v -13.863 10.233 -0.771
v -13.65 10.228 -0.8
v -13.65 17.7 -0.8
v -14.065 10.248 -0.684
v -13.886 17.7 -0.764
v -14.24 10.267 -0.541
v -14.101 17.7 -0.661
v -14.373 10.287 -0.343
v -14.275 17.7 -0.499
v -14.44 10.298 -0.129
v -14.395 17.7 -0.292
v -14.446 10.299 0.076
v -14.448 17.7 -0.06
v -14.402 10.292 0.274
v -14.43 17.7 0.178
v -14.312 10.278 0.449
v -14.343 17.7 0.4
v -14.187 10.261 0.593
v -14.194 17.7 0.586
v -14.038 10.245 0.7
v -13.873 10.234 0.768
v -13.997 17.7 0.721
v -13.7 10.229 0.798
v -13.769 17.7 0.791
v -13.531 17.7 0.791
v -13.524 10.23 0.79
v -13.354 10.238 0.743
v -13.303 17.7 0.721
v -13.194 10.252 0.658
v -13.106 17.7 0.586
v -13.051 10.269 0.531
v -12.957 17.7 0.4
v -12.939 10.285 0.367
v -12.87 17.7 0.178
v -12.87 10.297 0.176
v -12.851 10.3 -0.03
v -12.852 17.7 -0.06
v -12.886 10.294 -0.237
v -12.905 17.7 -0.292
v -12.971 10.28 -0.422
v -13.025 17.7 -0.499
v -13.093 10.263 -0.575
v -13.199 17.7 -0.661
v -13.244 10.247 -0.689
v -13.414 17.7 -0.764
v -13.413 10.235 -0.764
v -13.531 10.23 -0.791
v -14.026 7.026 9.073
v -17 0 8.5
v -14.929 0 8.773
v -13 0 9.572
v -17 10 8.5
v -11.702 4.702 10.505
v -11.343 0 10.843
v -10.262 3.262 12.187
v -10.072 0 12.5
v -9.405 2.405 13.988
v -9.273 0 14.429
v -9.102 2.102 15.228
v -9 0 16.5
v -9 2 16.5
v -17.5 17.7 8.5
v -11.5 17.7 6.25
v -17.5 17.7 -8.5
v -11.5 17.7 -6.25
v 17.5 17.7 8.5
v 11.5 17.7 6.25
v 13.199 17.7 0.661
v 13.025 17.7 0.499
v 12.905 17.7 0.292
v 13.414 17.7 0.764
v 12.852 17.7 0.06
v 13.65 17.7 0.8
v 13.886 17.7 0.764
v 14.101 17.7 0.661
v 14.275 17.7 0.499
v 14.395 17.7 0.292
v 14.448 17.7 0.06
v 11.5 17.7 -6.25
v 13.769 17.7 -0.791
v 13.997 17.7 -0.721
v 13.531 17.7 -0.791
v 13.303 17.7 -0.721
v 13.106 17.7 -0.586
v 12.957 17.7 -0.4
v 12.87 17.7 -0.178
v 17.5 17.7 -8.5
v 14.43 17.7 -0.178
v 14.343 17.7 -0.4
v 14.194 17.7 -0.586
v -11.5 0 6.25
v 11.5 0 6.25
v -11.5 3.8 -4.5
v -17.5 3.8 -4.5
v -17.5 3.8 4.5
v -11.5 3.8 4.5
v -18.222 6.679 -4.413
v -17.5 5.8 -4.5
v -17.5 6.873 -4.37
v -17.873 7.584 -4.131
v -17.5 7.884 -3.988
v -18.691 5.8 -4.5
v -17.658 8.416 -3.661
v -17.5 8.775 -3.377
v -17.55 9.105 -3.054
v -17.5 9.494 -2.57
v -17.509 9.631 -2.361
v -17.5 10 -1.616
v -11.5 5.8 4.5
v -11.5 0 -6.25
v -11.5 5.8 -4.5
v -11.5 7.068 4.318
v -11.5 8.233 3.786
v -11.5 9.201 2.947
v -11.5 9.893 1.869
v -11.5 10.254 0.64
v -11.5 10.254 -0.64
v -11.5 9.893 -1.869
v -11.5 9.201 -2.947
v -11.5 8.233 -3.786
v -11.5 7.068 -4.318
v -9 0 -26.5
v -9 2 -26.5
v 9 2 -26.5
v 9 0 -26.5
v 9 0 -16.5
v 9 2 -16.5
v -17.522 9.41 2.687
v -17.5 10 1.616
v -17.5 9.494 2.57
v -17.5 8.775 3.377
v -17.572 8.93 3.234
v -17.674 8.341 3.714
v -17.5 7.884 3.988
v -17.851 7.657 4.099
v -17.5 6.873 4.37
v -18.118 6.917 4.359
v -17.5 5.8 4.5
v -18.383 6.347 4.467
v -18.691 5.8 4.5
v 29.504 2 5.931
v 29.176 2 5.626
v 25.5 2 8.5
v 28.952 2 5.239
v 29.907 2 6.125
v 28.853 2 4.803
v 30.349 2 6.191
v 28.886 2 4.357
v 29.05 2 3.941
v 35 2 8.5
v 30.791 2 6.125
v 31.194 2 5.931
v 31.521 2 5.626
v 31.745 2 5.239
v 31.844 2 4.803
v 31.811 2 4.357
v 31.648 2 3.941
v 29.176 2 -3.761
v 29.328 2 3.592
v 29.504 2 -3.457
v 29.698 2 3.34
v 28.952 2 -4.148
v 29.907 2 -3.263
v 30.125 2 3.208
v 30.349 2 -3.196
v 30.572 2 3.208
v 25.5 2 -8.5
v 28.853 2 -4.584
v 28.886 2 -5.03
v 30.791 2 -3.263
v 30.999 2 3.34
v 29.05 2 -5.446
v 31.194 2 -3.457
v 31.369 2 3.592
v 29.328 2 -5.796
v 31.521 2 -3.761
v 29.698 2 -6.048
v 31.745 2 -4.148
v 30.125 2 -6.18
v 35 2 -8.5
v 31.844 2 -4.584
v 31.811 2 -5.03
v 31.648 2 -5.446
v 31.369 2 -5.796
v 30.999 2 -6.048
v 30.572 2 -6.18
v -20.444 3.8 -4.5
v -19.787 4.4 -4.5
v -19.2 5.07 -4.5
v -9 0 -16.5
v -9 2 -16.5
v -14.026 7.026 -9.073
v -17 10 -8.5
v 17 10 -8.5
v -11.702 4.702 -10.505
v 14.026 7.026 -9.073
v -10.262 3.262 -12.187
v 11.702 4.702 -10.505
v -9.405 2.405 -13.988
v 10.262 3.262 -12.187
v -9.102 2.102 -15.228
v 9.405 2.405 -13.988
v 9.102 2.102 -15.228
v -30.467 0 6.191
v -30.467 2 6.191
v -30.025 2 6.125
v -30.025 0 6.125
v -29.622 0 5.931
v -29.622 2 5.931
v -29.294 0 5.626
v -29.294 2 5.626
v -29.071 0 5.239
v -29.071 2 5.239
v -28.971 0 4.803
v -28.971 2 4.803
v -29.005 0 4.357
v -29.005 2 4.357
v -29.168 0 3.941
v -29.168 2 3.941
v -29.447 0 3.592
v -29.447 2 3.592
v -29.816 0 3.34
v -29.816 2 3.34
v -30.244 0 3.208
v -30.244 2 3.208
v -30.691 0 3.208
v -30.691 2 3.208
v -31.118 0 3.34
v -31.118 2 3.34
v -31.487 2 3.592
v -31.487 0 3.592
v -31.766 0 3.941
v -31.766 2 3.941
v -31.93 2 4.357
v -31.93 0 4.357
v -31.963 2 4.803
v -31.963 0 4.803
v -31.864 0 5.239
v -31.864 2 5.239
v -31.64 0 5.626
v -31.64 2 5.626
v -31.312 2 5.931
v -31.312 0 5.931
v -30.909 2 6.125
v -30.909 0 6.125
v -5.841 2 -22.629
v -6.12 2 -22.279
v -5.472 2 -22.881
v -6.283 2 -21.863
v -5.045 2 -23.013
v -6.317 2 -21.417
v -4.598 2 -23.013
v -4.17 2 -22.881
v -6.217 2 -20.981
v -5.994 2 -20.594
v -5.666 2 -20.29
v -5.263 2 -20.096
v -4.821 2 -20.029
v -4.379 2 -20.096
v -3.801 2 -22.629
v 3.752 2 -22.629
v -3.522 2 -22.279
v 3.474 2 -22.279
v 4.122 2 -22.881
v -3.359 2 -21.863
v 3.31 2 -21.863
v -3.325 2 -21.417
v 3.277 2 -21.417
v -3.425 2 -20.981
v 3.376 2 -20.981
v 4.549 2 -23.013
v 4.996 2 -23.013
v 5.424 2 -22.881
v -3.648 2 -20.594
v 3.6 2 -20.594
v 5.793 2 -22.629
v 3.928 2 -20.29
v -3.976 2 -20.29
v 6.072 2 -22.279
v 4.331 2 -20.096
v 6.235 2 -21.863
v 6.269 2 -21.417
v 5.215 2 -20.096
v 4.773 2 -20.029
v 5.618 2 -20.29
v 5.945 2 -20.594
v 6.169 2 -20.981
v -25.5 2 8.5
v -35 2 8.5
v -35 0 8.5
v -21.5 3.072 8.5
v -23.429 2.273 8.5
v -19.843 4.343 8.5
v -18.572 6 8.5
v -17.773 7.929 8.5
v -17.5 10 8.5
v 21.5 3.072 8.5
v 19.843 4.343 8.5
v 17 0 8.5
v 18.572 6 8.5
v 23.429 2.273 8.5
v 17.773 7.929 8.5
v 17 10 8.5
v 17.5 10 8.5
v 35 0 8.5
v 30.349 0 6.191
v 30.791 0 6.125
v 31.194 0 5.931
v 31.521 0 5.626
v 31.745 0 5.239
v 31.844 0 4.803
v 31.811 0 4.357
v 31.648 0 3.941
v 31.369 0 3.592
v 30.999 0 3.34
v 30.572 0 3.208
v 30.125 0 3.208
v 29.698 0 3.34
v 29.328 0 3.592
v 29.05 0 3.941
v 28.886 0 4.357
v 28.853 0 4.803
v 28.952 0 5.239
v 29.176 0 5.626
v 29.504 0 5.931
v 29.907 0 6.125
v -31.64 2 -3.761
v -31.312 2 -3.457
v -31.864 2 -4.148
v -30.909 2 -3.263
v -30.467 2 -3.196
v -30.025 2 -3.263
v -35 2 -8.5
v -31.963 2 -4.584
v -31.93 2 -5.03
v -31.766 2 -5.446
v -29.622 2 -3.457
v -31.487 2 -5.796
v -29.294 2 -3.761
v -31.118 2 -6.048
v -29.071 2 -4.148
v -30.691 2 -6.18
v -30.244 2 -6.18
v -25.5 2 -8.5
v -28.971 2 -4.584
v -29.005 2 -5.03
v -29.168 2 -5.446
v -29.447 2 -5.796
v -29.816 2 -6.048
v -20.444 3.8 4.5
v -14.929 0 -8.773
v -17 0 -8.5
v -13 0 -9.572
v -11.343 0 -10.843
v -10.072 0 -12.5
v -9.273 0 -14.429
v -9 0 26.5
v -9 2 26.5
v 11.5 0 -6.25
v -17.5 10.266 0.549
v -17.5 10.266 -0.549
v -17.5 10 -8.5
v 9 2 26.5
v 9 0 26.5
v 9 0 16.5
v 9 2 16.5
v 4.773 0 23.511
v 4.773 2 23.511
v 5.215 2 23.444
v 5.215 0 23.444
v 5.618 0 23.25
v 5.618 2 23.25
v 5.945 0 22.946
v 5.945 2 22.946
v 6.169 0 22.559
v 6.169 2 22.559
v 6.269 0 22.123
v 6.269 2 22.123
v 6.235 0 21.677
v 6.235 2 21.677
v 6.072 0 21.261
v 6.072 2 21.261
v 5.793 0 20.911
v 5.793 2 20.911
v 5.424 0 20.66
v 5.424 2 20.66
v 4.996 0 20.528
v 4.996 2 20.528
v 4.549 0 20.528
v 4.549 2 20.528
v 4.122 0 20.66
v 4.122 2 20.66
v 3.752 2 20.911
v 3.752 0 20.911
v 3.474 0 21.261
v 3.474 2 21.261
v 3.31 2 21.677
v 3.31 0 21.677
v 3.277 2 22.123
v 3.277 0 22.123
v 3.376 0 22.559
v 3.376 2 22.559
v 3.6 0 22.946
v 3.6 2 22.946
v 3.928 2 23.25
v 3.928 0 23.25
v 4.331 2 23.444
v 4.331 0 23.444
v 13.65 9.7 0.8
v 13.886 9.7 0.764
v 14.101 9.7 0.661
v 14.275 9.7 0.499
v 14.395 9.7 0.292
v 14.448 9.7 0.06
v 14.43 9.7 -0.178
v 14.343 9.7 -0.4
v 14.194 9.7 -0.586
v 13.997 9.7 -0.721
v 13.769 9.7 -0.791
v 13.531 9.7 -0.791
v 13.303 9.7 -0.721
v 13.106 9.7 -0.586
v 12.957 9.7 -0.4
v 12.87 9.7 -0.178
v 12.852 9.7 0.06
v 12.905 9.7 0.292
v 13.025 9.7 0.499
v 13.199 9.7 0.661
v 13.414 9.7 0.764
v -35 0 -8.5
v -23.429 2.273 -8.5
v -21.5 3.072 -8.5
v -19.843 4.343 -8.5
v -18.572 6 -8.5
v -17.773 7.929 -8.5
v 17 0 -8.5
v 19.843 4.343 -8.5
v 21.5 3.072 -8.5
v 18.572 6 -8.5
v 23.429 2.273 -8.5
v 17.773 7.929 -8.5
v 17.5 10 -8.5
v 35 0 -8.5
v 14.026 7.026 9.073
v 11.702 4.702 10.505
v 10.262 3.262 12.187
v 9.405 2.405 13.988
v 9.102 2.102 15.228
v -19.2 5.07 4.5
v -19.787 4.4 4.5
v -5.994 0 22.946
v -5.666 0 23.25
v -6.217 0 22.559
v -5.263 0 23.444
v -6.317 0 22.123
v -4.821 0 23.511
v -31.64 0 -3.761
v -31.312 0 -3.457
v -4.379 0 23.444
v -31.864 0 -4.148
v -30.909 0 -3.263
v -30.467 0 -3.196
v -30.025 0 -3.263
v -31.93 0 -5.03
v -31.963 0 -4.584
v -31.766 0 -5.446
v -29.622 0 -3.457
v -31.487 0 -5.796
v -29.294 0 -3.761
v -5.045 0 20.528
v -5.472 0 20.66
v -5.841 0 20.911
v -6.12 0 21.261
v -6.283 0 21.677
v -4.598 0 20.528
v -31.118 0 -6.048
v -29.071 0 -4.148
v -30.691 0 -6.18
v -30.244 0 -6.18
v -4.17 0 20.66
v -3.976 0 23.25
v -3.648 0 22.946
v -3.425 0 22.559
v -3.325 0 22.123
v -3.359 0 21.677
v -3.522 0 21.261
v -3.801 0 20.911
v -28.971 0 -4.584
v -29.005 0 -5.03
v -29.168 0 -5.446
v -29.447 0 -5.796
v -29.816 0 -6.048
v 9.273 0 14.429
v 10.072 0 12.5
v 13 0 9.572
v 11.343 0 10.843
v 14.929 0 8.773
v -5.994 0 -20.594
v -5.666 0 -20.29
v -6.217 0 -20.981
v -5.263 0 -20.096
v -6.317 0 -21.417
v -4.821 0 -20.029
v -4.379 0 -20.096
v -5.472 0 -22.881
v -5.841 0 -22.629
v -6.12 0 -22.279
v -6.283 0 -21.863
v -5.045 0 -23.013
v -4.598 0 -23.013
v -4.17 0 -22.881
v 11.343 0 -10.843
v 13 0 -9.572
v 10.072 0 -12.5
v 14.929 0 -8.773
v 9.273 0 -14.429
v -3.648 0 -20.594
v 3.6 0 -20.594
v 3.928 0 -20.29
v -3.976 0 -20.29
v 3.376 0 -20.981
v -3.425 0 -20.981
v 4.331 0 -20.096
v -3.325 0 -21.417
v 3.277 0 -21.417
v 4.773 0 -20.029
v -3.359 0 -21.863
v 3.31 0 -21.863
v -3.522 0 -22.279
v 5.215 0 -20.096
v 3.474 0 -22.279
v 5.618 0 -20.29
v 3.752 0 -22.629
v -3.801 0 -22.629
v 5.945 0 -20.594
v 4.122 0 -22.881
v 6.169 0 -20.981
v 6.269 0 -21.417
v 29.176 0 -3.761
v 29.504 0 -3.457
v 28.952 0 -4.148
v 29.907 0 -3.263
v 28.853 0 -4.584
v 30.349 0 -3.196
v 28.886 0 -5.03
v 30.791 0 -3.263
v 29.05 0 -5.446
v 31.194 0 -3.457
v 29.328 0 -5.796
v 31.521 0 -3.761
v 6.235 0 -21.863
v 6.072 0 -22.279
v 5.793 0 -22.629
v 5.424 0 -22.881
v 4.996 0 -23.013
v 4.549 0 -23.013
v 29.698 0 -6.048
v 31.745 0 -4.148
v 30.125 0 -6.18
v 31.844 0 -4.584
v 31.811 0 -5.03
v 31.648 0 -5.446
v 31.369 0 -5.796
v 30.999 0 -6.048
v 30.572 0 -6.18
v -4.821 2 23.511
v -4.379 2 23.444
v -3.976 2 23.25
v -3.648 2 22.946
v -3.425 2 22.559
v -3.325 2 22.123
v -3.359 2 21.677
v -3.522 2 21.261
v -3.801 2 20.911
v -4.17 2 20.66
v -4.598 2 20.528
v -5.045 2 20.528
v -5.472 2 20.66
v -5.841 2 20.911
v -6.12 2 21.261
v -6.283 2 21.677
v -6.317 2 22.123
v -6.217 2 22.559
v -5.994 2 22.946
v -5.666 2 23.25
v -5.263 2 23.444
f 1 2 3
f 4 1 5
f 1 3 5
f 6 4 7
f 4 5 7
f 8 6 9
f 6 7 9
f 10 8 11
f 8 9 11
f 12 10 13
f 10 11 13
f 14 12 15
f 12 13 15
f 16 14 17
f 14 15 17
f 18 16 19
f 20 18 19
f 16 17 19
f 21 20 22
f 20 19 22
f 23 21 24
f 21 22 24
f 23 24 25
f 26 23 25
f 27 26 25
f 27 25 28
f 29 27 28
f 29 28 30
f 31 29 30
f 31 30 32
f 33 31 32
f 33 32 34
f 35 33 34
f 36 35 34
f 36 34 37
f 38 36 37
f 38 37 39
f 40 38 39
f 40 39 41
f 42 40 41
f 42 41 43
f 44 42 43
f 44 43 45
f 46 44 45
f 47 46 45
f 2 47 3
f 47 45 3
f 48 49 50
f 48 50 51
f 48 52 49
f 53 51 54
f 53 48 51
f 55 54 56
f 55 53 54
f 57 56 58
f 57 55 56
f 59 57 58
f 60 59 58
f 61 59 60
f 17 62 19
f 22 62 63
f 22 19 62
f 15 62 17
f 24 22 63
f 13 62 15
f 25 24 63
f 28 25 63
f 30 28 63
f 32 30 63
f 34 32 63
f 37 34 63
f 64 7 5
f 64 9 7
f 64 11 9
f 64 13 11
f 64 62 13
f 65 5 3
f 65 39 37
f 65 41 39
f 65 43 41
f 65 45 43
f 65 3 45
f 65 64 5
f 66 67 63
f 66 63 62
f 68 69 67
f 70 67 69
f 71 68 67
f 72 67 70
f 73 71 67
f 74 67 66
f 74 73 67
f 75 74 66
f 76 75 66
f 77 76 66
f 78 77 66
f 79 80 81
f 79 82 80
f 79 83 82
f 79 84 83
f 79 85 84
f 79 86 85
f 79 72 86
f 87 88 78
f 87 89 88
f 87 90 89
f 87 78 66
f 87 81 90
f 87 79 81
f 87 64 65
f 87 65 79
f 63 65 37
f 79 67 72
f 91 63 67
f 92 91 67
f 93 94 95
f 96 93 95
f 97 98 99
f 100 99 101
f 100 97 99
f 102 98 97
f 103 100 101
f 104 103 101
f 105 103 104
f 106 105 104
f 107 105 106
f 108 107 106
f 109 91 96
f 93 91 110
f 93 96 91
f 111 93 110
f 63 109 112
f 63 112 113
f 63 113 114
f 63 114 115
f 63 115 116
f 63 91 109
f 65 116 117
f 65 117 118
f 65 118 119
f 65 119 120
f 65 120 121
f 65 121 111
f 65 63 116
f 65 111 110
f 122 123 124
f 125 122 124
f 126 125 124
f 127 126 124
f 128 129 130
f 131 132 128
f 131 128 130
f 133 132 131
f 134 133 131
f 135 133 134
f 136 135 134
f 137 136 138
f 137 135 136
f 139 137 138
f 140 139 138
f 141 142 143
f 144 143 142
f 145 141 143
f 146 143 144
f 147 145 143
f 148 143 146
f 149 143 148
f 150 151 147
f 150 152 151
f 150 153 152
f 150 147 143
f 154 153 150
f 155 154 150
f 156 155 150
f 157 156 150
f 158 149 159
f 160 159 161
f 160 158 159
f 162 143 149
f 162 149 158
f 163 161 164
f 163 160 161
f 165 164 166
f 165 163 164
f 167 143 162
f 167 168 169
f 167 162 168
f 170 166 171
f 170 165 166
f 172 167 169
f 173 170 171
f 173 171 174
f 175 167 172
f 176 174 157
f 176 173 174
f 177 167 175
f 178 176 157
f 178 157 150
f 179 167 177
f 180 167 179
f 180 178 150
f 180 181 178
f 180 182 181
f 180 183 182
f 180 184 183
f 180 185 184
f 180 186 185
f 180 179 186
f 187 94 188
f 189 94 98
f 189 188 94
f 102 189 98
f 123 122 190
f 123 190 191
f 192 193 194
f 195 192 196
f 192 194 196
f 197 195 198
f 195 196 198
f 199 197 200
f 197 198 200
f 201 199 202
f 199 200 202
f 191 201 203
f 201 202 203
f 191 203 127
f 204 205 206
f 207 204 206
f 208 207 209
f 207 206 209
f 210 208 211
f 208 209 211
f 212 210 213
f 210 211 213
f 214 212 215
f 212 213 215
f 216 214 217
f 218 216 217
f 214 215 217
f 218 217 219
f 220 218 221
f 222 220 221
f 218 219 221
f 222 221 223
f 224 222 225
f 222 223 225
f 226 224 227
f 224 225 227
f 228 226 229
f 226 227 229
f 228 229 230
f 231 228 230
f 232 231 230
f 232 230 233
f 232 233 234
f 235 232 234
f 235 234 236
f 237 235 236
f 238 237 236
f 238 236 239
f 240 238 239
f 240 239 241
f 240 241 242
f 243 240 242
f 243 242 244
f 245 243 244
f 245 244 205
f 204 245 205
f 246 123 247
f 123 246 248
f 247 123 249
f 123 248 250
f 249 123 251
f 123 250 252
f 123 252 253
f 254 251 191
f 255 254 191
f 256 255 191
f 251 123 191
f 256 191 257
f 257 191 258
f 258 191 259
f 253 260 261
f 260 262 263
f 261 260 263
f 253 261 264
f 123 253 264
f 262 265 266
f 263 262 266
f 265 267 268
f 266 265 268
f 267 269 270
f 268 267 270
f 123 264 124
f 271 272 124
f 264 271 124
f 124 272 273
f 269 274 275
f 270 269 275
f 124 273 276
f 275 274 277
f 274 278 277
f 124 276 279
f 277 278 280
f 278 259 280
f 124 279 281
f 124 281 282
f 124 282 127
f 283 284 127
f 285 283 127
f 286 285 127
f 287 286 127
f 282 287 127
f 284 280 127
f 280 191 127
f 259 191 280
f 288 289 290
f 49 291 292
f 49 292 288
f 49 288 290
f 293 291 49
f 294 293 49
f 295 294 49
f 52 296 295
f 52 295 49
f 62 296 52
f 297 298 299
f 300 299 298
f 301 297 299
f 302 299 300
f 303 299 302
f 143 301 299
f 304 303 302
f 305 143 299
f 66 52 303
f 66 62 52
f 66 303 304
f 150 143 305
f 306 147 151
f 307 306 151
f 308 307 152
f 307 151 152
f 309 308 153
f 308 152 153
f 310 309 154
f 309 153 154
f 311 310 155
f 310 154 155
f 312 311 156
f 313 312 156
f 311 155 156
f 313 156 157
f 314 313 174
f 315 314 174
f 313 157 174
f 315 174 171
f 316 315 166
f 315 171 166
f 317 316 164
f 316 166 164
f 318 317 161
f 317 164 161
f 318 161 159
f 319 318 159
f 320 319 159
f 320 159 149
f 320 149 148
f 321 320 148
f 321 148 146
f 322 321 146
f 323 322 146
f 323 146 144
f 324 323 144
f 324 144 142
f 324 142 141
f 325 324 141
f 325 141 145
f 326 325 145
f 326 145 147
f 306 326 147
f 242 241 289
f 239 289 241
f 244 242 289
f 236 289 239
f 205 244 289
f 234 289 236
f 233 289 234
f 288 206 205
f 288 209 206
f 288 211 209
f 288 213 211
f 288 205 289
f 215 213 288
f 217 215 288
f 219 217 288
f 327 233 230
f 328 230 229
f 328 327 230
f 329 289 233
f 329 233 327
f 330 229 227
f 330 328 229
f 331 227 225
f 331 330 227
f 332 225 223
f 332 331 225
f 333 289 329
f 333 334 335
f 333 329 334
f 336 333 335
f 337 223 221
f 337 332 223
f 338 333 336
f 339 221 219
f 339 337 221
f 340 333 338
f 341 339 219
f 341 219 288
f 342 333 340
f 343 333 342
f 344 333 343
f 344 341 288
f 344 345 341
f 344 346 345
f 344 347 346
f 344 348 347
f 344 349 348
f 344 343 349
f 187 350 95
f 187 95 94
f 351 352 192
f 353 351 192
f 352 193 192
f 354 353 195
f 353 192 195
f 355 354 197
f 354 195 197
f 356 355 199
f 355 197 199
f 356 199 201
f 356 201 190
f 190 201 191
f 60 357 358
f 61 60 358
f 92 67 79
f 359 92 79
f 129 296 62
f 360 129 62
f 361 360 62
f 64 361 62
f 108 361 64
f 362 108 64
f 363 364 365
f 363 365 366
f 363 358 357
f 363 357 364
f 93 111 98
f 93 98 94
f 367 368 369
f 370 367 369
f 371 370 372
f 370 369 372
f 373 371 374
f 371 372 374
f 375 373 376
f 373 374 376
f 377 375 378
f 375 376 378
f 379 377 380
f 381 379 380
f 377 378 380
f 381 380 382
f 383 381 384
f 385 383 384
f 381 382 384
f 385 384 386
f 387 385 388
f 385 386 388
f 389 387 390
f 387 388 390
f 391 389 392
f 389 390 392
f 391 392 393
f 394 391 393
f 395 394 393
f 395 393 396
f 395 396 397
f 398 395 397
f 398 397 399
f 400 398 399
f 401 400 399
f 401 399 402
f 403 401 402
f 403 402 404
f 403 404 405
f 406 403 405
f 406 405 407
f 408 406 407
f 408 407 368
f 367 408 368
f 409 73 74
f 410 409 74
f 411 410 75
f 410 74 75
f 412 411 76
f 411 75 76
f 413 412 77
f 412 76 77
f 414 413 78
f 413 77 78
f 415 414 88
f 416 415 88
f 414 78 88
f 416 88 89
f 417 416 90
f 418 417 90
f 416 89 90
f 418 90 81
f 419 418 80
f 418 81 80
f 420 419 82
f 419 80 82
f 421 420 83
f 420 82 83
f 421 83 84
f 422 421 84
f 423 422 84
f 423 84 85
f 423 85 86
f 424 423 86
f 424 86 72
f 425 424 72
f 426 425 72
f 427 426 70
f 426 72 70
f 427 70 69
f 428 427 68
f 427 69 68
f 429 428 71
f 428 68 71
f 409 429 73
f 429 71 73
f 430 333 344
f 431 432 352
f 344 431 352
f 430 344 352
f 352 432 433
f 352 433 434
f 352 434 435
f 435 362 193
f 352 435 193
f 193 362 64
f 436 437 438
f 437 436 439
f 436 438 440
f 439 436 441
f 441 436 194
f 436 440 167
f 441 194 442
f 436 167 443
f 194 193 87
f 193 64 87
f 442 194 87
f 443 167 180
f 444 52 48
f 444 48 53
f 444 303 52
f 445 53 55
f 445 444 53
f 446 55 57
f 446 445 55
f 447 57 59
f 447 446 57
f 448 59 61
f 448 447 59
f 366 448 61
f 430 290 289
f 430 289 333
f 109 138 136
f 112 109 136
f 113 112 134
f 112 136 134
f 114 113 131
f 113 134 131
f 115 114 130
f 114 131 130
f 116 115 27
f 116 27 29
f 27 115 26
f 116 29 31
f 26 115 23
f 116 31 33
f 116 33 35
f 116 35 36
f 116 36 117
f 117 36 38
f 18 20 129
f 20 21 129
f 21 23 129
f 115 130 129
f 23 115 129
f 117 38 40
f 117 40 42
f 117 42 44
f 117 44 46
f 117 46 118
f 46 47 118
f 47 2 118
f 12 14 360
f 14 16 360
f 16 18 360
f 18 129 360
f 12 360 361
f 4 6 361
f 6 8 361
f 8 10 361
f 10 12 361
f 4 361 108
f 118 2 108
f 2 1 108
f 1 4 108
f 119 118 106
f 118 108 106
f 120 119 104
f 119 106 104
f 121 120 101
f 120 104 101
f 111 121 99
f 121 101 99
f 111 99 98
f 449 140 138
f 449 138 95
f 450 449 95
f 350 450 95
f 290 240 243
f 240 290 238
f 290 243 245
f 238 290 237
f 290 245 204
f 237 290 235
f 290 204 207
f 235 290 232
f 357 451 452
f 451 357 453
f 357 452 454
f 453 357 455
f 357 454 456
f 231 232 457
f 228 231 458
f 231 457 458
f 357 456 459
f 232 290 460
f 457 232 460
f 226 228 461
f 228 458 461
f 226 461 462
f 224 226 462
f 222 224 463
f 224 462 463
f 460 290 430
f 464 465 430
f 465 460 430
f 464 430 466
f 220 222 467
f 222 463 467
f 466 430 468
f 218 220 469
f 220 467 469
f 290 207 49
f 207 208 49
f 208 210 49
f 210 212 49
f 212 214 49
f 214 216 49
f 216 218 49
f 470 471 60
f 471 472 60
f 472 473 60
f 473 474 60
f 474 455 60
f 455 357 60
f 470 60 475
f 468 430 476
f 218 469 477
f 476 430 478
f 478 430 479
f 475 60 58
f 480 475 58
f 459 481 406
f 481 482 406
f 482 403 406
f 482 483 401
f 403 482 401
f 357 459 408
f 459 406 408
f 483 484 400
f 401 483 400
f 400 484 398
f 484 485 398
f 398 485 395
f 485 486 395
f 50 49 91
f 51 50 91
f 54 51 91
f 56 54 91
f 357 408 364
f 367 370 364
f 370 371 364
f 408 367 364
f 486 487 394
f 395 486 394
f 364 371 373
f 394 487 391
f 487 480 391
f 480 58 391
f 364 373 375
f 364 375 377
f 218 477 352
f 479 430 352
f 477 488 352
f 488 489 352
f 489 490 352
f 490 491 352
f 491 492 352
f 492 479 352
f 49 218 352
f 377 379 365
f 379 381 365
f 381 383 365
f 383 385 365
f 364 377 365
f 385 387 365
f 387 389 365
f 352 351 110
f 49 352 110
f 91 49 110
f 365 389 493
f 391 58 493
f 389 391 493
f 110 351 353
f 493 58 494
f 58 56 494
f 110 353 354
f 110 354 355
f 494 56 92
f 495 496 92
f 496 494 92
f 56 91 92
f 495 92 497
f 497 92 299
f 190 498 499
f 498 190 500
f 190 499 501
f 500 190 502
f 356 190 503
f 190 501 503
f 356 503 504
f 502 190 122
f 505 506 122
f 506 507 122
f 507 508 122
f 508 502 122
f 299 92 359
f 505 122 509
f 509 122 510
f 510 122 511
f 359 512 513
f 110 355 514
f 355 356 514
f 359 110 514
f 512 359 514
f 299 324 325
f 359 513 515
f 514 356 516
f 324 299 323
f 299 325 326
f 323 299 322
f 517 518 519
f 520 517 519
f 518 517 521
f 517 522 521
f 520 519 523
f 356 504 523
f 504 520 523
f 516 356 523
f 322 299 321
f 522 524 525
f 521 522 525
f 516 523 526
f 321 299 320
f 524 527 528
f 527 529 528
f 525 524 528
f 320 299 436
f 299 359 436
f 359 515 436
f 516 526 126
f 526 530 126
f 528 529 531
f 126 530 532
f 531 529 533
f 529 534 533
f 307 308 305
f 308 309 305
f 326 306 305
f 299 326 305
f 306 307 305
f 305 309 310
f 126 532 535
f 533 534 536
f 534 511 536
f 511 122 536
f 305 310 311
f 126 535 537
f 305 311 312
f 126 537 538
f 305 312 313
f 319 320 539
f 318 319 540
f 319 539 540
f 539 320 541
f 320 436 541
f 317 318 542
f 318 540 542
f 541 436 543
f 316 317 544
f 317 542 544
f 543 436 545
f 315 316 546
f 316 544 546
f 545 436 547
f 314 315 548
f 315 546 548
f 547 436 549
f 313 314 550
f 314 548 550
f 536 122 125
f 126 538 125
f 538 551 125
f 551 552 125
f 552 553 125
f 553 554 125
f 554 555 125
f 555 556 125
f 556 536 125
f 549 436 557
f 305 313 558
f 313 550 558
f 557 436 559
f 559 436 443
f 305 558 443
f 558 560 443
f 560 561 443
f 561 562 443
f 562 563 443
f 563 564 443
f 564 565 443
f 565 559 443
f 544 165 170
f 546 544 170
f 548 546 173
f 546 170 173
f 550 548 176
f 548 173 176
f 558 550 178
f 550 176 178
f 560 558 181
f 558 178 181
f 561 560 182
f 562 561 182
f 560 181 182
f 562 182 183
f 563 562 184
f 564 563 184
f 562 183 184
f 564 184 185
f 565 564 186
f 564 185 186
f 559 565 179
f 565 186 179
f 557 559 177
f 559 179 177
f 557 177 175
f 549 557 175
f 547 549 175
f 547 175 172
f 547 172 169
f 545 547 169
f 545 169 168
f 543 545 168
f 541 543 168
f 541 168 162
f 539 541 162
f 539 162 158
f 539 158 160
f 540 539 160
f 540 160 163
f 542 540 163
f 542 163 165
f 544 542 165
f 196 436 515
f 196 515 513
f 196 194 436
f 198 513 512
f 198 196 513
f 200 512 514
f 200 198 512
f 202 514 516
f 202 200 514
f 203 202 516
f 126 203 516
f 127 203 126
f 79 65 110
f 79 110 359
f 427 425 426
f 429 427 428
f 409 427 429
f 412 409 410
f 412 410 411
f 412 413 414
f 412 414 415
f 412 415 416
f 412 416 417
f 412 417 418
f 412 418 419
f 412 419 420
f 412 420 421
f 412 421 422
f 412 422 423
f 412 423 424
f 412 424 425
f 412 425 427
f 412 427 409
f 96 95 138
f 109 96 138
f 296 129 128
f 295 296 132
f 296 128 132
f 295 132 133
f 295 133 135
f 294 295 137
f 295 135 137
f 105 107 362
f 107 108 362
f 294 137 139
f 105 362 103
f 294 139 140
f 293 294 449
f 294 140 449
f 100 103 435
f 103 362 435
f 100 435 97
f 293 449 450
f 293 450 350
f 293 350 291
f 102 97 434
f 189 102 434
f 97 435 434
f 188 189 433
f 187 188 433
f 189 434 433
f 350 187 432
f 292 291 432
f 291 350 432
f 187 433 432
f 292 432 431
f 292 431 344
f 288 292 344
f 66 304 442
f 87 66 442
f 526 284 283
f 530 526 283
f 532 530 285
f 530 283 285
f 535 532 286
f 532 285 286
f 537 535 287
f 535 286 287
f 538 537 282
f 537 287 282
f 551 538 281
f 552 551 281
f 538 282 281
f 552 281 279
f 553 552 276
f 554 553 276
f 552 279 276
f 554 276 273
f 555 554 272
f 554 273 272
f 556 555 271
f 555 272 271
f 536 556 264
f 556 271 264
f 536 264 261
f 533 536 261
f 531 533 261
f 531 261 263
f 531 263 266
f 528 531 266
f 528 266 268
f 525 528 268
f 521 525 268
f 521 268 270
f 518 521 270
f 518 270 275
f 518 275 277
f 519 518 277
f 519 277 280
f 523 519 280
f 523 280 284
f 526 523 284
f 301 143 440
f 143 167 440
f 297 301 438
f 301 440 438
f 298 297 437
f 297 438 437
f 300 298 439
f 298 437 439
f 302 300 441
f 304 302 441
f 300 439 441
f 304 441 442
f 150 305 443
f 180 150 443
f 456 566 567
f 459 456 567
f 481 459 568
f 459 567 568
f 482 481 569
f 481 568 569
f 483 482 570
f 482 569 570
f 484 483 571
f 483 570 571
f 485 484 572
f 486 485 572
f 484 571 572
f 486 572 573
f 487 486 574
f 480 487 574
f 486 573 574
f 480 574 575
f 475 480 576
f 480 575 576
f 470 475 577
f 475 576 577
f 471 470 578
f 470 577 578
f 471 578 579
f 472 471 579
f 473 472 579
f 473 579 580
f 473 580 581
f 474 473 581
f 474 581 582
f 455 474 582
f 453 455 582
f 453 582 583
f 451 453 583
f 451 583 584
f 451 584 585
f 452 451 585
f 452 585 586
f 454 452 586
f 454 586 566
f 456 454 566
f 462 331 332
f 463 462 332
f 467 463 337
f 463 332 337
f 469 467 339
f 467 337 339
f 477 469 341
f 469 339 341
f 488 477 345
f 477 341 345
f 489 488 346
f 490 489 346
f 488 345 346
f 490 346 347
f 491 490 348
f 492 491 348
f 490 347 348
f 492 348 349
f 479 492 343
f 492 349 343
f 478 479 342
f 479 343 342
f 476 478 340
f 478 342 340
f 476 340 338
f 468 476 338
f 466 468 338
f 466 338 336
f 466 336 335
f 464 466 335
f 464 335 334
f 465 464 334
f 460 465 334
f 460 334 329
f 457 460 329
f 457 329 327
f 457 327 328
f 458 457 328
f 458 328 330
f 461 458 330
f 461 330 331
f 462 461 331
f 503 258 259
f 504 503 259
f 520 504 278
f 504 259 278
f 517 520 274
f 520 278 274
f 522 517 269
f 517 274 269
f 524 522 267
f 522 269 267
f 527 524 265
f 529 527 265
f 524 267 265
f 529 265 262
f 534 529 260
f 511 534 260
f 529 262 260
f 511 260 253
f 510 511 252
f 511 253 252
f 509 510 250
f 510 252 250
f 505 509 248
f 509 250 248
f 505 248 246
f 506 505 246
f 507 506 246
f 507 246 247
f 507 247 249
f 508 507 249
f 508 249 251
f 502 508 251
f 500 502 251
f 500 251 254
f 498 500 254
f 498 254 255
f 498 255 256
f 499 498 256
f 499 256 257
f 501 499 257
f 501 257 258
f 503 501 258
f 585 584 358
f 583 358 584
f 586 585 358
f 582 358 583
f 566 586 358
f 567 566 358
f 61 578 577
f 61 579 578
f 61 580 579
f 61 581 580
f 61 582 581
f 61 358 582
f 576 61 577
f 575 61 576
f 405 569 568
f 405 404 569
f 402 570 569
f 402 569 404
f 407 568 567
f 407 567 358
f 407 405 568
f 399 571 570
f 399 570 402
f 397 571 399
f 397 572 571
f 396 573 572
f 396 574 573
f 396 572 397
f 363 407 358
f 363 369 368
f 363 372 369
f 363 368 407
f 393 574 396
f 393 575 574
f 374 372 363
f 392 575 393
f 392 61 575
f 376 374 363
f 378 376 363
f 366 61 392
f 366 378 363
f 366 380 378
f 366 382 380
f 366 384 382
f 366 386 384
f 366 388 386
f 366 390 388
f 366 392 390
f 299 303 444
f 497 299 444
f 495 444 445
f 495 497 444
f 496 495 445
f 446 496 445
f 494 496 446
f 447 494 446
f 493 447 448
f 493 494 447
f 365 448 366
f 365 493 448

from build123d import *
from build123d.topology import SkipClean

# Parameters (mm, degrees)
SKETCH2_W           = 70
SKETCH2_H           = 17
BOSS_EXTRUDE1_DEPTH = 2
SKETCH3_W           = 35
SKETCH3_H           = 17
BOSS_EXTRUDE2_DEPTH = 15.7
SKETCH4_W           = 23
SKETCH4_H           = 12.5
CUT_EXTRUDE1_DEPTH  = 41.131533736
SKETCH6_R           = 0.8
CUT_EXTRUDE2_DEPTH  = 8
CUT_EXTRUDE3_DEPTH  = 8
SKETCH9_W           = 18
SKETCH9_H           = 2
BOSS_EXTRUDE3_DEPTH = 18
FILLET1_R           = 8
FILLET2_R           = 8
FILLET3_START       = -8.5
FILLET3_DEPTH       = 17
FILLET3_START_2     = -25.5
FILLET3_2_DEPTH     = 8
SKETCH11_R          = 1.5
CUT_EXTRUDE4_DEPTH  = 18


with BuildPart() as part:
    # Sketch2 → Boss-Extrude1 (new body)
    with BuildSketch(Plane(origin=(0, 0, 0), x_dir=(1, 0, 0), z_dir=(0, 1, 0))):
        Rectangle(SKETCH2_W, SKETCH2_H)
    extrude(amount=BOSS_EXTRUDE1_DEPTH)

    # Sketch3 → Boss-Extrude2 (add)
    with BuildSketch(Plane(origin=(0, 2, 0), x_dir=(1, 0, 0), z_dir=(0, 1, 0))):
        Rectangle(SKETCH3_W, SKETCH3_H)
    extrude(amount=BOSS_EXTRUDE2_DEPTH)

    # Sketch4 → Cut-Extrude1 (cut, through all)
    with BuildSketch(Plane(origin=(0, 17.7, 0), x_dir=(1, 0, 0), z_dir=(0, 1, 0))):
        Rectangle(SKETCH4_W, SKETCH4_H)
    extrude(amount=-CUT_EXTRUDE1_DEPTH, mode=Mode.SUBTRACT)

    # Sketch6 → Cut-Extrude2 (cut)
    with BuildSketch(Plane(origin=(0, 17.7, 0), x_dir=(1, 0, 0), z_dir=(0, 1, 0))):
        with Locations(Location((13.65, 0, 0), (0, 0, 270))):
            Circle(SKETCH6_R)
        with Locations(Location((-13.65, 0, 0), (0, 0, 90))):
            Circle(SKETCH6_R)
    extrude(amount=-CUT_EXTRUDE2_DEPTH, mode=Mode.SUBTRACT)

    # Sketch7 → Cut-Extrude3 (cut)
    with BuildSketch(Plane.ZY.offset(17.5)):
        with BuildLine():
            Line((-4.5, 5.8), (-4.5, 3.8))
            Line((-4.5, 3.8), (4.5, 3.8))
            Line((4.5, 3.8), (4.5, 5.8))
            ThreePointArc((4.5, 5.8), (0, 10.3), (-4.5, 5.8))
        make_face()
    extrude(amount=-CUT_EXTRUDE3_DEPTH, mode=Mode.SUBTRACT)

    # Sketch9 → Boss-Extrude3 (add)
    with BuildSketch(Plane.XY.offset(8.5)):
        with Locations((0, 1)):
            Rectangle(SKETCH9_W, SKETCH9_H)
    boss_extrude3 = extrude(amount=BOSS_EXTRUDE3_DEPTH)

    # Mirror1: Boss-Extrude3 across plane
    add(boss_extrude3.mirror(Plane.XY))

    # Fillet1
    fillet1_edges = [part.edges().sort_by_distance(p)[0] for p in [
        (0, 2, 8.5),
    ]]
    fillet(fillet1_edges, radius=FILLET1_R)

    # Fillet2
    fillet2_edges = [part.edges().sort_by_distance(p)[0] for p in [
        (-9, 1, -8.5),
        (-9, 5, 8.5),
        (9, 5, 8.5),
        (9, 1, -8.5),
        (0, 2, -8.5),
        (17.5, 2, 0),
    ]]
    fillet(fillet2_edges, radius=FILLET2_R)

    # Fillet3: read off the stored shape, not the designer's step
    # Fillet3 outline → Fillet3 (add)
    with BuildSketch(Plane.XY.offset(FILLET3_START)):
        with BuildLine():
            ThreePointArc((-17.5, 10.00000495), (-19.843144, 4.343147501), (-25.5, 2))
            Line((-25.5, 2), (-17.5, 2))
            Line((-17.5, 2), (-17.5, 10.00000495))
        make_face()
    extrude(amount=FILLET3_DEPTH)

    # Fillet3 2 outline → Fillet3 2 (cut)
    with SkipClean():  # the faces are left unmerged after this step: merging them gives an invalid solid
        with BuildSketch(Plane.YZ.offset(FILLET3_START_2)):
            with BuildLine():
                ThreePointArc((5.799996271, -4.5), (10.3, -1.865e-06), (5.8, 4.5))
                Line((5.8, 4.5), (3.8, 4.5))
                Line((3.8, 4.5), (3.8, -4.5))
                Line((3.8, -4.5), (5.799996271, -4.5))
            make_face()
        extrude(amount=FILLET3_2_DEPTH, mode=Mode.SUBTRACT)

    # Sketch11 → Cut-Extrude4 (cut)
    with SkipClean():  # the faces are left unmerged after this step: merging them gives an invalid solid
        with BuildSketch(Plane(origin=(0, 2, 0), x_dir=(1, 0, 0), z_dir=(0, 1, 0))):
            with Locations(Location((4.772736854, 21.529356347, 0), (0, 0, 270))):
                Circle(SKETCH11_R)
            with Locations(Location((-4.821076753, 21.529356347, 0), (0, 0, 270))):
                Circle(SKETCH11_R)
            with Locations(Location((4.772736854, -22.011031546, 0), (0, 0, 270))):
                Circle(SKETCH11_R)
            with Locations(Location((-4.821076753, -22.011031546, 0), (0, 0, 270))):
                Circle(SKETCH11_R)
            with Locations(Location((30.348655276, 4.696340636, 0), (0, 0, 270))):
                Circle(SKETCH11_R)
            with Locations(Location((30.348655276, -4.691151825, 0), (0, 0, 270))):
                Circle(SKETCH11_R)
            with Locations(Location((-30.467199024, -4.691151825, 0), (0, 0, 270))):
                Circle(SKETCH11_R)
            with Locations(Location((-30.467199024, 4.696340636, 0), (0, 0, 270))):
                Circle(SKETCH11_R)
        extrude(amount=-CUT_EXTRUDE4_DEPTH, mode=Mode.SUBTRACT)


solid = part.part
